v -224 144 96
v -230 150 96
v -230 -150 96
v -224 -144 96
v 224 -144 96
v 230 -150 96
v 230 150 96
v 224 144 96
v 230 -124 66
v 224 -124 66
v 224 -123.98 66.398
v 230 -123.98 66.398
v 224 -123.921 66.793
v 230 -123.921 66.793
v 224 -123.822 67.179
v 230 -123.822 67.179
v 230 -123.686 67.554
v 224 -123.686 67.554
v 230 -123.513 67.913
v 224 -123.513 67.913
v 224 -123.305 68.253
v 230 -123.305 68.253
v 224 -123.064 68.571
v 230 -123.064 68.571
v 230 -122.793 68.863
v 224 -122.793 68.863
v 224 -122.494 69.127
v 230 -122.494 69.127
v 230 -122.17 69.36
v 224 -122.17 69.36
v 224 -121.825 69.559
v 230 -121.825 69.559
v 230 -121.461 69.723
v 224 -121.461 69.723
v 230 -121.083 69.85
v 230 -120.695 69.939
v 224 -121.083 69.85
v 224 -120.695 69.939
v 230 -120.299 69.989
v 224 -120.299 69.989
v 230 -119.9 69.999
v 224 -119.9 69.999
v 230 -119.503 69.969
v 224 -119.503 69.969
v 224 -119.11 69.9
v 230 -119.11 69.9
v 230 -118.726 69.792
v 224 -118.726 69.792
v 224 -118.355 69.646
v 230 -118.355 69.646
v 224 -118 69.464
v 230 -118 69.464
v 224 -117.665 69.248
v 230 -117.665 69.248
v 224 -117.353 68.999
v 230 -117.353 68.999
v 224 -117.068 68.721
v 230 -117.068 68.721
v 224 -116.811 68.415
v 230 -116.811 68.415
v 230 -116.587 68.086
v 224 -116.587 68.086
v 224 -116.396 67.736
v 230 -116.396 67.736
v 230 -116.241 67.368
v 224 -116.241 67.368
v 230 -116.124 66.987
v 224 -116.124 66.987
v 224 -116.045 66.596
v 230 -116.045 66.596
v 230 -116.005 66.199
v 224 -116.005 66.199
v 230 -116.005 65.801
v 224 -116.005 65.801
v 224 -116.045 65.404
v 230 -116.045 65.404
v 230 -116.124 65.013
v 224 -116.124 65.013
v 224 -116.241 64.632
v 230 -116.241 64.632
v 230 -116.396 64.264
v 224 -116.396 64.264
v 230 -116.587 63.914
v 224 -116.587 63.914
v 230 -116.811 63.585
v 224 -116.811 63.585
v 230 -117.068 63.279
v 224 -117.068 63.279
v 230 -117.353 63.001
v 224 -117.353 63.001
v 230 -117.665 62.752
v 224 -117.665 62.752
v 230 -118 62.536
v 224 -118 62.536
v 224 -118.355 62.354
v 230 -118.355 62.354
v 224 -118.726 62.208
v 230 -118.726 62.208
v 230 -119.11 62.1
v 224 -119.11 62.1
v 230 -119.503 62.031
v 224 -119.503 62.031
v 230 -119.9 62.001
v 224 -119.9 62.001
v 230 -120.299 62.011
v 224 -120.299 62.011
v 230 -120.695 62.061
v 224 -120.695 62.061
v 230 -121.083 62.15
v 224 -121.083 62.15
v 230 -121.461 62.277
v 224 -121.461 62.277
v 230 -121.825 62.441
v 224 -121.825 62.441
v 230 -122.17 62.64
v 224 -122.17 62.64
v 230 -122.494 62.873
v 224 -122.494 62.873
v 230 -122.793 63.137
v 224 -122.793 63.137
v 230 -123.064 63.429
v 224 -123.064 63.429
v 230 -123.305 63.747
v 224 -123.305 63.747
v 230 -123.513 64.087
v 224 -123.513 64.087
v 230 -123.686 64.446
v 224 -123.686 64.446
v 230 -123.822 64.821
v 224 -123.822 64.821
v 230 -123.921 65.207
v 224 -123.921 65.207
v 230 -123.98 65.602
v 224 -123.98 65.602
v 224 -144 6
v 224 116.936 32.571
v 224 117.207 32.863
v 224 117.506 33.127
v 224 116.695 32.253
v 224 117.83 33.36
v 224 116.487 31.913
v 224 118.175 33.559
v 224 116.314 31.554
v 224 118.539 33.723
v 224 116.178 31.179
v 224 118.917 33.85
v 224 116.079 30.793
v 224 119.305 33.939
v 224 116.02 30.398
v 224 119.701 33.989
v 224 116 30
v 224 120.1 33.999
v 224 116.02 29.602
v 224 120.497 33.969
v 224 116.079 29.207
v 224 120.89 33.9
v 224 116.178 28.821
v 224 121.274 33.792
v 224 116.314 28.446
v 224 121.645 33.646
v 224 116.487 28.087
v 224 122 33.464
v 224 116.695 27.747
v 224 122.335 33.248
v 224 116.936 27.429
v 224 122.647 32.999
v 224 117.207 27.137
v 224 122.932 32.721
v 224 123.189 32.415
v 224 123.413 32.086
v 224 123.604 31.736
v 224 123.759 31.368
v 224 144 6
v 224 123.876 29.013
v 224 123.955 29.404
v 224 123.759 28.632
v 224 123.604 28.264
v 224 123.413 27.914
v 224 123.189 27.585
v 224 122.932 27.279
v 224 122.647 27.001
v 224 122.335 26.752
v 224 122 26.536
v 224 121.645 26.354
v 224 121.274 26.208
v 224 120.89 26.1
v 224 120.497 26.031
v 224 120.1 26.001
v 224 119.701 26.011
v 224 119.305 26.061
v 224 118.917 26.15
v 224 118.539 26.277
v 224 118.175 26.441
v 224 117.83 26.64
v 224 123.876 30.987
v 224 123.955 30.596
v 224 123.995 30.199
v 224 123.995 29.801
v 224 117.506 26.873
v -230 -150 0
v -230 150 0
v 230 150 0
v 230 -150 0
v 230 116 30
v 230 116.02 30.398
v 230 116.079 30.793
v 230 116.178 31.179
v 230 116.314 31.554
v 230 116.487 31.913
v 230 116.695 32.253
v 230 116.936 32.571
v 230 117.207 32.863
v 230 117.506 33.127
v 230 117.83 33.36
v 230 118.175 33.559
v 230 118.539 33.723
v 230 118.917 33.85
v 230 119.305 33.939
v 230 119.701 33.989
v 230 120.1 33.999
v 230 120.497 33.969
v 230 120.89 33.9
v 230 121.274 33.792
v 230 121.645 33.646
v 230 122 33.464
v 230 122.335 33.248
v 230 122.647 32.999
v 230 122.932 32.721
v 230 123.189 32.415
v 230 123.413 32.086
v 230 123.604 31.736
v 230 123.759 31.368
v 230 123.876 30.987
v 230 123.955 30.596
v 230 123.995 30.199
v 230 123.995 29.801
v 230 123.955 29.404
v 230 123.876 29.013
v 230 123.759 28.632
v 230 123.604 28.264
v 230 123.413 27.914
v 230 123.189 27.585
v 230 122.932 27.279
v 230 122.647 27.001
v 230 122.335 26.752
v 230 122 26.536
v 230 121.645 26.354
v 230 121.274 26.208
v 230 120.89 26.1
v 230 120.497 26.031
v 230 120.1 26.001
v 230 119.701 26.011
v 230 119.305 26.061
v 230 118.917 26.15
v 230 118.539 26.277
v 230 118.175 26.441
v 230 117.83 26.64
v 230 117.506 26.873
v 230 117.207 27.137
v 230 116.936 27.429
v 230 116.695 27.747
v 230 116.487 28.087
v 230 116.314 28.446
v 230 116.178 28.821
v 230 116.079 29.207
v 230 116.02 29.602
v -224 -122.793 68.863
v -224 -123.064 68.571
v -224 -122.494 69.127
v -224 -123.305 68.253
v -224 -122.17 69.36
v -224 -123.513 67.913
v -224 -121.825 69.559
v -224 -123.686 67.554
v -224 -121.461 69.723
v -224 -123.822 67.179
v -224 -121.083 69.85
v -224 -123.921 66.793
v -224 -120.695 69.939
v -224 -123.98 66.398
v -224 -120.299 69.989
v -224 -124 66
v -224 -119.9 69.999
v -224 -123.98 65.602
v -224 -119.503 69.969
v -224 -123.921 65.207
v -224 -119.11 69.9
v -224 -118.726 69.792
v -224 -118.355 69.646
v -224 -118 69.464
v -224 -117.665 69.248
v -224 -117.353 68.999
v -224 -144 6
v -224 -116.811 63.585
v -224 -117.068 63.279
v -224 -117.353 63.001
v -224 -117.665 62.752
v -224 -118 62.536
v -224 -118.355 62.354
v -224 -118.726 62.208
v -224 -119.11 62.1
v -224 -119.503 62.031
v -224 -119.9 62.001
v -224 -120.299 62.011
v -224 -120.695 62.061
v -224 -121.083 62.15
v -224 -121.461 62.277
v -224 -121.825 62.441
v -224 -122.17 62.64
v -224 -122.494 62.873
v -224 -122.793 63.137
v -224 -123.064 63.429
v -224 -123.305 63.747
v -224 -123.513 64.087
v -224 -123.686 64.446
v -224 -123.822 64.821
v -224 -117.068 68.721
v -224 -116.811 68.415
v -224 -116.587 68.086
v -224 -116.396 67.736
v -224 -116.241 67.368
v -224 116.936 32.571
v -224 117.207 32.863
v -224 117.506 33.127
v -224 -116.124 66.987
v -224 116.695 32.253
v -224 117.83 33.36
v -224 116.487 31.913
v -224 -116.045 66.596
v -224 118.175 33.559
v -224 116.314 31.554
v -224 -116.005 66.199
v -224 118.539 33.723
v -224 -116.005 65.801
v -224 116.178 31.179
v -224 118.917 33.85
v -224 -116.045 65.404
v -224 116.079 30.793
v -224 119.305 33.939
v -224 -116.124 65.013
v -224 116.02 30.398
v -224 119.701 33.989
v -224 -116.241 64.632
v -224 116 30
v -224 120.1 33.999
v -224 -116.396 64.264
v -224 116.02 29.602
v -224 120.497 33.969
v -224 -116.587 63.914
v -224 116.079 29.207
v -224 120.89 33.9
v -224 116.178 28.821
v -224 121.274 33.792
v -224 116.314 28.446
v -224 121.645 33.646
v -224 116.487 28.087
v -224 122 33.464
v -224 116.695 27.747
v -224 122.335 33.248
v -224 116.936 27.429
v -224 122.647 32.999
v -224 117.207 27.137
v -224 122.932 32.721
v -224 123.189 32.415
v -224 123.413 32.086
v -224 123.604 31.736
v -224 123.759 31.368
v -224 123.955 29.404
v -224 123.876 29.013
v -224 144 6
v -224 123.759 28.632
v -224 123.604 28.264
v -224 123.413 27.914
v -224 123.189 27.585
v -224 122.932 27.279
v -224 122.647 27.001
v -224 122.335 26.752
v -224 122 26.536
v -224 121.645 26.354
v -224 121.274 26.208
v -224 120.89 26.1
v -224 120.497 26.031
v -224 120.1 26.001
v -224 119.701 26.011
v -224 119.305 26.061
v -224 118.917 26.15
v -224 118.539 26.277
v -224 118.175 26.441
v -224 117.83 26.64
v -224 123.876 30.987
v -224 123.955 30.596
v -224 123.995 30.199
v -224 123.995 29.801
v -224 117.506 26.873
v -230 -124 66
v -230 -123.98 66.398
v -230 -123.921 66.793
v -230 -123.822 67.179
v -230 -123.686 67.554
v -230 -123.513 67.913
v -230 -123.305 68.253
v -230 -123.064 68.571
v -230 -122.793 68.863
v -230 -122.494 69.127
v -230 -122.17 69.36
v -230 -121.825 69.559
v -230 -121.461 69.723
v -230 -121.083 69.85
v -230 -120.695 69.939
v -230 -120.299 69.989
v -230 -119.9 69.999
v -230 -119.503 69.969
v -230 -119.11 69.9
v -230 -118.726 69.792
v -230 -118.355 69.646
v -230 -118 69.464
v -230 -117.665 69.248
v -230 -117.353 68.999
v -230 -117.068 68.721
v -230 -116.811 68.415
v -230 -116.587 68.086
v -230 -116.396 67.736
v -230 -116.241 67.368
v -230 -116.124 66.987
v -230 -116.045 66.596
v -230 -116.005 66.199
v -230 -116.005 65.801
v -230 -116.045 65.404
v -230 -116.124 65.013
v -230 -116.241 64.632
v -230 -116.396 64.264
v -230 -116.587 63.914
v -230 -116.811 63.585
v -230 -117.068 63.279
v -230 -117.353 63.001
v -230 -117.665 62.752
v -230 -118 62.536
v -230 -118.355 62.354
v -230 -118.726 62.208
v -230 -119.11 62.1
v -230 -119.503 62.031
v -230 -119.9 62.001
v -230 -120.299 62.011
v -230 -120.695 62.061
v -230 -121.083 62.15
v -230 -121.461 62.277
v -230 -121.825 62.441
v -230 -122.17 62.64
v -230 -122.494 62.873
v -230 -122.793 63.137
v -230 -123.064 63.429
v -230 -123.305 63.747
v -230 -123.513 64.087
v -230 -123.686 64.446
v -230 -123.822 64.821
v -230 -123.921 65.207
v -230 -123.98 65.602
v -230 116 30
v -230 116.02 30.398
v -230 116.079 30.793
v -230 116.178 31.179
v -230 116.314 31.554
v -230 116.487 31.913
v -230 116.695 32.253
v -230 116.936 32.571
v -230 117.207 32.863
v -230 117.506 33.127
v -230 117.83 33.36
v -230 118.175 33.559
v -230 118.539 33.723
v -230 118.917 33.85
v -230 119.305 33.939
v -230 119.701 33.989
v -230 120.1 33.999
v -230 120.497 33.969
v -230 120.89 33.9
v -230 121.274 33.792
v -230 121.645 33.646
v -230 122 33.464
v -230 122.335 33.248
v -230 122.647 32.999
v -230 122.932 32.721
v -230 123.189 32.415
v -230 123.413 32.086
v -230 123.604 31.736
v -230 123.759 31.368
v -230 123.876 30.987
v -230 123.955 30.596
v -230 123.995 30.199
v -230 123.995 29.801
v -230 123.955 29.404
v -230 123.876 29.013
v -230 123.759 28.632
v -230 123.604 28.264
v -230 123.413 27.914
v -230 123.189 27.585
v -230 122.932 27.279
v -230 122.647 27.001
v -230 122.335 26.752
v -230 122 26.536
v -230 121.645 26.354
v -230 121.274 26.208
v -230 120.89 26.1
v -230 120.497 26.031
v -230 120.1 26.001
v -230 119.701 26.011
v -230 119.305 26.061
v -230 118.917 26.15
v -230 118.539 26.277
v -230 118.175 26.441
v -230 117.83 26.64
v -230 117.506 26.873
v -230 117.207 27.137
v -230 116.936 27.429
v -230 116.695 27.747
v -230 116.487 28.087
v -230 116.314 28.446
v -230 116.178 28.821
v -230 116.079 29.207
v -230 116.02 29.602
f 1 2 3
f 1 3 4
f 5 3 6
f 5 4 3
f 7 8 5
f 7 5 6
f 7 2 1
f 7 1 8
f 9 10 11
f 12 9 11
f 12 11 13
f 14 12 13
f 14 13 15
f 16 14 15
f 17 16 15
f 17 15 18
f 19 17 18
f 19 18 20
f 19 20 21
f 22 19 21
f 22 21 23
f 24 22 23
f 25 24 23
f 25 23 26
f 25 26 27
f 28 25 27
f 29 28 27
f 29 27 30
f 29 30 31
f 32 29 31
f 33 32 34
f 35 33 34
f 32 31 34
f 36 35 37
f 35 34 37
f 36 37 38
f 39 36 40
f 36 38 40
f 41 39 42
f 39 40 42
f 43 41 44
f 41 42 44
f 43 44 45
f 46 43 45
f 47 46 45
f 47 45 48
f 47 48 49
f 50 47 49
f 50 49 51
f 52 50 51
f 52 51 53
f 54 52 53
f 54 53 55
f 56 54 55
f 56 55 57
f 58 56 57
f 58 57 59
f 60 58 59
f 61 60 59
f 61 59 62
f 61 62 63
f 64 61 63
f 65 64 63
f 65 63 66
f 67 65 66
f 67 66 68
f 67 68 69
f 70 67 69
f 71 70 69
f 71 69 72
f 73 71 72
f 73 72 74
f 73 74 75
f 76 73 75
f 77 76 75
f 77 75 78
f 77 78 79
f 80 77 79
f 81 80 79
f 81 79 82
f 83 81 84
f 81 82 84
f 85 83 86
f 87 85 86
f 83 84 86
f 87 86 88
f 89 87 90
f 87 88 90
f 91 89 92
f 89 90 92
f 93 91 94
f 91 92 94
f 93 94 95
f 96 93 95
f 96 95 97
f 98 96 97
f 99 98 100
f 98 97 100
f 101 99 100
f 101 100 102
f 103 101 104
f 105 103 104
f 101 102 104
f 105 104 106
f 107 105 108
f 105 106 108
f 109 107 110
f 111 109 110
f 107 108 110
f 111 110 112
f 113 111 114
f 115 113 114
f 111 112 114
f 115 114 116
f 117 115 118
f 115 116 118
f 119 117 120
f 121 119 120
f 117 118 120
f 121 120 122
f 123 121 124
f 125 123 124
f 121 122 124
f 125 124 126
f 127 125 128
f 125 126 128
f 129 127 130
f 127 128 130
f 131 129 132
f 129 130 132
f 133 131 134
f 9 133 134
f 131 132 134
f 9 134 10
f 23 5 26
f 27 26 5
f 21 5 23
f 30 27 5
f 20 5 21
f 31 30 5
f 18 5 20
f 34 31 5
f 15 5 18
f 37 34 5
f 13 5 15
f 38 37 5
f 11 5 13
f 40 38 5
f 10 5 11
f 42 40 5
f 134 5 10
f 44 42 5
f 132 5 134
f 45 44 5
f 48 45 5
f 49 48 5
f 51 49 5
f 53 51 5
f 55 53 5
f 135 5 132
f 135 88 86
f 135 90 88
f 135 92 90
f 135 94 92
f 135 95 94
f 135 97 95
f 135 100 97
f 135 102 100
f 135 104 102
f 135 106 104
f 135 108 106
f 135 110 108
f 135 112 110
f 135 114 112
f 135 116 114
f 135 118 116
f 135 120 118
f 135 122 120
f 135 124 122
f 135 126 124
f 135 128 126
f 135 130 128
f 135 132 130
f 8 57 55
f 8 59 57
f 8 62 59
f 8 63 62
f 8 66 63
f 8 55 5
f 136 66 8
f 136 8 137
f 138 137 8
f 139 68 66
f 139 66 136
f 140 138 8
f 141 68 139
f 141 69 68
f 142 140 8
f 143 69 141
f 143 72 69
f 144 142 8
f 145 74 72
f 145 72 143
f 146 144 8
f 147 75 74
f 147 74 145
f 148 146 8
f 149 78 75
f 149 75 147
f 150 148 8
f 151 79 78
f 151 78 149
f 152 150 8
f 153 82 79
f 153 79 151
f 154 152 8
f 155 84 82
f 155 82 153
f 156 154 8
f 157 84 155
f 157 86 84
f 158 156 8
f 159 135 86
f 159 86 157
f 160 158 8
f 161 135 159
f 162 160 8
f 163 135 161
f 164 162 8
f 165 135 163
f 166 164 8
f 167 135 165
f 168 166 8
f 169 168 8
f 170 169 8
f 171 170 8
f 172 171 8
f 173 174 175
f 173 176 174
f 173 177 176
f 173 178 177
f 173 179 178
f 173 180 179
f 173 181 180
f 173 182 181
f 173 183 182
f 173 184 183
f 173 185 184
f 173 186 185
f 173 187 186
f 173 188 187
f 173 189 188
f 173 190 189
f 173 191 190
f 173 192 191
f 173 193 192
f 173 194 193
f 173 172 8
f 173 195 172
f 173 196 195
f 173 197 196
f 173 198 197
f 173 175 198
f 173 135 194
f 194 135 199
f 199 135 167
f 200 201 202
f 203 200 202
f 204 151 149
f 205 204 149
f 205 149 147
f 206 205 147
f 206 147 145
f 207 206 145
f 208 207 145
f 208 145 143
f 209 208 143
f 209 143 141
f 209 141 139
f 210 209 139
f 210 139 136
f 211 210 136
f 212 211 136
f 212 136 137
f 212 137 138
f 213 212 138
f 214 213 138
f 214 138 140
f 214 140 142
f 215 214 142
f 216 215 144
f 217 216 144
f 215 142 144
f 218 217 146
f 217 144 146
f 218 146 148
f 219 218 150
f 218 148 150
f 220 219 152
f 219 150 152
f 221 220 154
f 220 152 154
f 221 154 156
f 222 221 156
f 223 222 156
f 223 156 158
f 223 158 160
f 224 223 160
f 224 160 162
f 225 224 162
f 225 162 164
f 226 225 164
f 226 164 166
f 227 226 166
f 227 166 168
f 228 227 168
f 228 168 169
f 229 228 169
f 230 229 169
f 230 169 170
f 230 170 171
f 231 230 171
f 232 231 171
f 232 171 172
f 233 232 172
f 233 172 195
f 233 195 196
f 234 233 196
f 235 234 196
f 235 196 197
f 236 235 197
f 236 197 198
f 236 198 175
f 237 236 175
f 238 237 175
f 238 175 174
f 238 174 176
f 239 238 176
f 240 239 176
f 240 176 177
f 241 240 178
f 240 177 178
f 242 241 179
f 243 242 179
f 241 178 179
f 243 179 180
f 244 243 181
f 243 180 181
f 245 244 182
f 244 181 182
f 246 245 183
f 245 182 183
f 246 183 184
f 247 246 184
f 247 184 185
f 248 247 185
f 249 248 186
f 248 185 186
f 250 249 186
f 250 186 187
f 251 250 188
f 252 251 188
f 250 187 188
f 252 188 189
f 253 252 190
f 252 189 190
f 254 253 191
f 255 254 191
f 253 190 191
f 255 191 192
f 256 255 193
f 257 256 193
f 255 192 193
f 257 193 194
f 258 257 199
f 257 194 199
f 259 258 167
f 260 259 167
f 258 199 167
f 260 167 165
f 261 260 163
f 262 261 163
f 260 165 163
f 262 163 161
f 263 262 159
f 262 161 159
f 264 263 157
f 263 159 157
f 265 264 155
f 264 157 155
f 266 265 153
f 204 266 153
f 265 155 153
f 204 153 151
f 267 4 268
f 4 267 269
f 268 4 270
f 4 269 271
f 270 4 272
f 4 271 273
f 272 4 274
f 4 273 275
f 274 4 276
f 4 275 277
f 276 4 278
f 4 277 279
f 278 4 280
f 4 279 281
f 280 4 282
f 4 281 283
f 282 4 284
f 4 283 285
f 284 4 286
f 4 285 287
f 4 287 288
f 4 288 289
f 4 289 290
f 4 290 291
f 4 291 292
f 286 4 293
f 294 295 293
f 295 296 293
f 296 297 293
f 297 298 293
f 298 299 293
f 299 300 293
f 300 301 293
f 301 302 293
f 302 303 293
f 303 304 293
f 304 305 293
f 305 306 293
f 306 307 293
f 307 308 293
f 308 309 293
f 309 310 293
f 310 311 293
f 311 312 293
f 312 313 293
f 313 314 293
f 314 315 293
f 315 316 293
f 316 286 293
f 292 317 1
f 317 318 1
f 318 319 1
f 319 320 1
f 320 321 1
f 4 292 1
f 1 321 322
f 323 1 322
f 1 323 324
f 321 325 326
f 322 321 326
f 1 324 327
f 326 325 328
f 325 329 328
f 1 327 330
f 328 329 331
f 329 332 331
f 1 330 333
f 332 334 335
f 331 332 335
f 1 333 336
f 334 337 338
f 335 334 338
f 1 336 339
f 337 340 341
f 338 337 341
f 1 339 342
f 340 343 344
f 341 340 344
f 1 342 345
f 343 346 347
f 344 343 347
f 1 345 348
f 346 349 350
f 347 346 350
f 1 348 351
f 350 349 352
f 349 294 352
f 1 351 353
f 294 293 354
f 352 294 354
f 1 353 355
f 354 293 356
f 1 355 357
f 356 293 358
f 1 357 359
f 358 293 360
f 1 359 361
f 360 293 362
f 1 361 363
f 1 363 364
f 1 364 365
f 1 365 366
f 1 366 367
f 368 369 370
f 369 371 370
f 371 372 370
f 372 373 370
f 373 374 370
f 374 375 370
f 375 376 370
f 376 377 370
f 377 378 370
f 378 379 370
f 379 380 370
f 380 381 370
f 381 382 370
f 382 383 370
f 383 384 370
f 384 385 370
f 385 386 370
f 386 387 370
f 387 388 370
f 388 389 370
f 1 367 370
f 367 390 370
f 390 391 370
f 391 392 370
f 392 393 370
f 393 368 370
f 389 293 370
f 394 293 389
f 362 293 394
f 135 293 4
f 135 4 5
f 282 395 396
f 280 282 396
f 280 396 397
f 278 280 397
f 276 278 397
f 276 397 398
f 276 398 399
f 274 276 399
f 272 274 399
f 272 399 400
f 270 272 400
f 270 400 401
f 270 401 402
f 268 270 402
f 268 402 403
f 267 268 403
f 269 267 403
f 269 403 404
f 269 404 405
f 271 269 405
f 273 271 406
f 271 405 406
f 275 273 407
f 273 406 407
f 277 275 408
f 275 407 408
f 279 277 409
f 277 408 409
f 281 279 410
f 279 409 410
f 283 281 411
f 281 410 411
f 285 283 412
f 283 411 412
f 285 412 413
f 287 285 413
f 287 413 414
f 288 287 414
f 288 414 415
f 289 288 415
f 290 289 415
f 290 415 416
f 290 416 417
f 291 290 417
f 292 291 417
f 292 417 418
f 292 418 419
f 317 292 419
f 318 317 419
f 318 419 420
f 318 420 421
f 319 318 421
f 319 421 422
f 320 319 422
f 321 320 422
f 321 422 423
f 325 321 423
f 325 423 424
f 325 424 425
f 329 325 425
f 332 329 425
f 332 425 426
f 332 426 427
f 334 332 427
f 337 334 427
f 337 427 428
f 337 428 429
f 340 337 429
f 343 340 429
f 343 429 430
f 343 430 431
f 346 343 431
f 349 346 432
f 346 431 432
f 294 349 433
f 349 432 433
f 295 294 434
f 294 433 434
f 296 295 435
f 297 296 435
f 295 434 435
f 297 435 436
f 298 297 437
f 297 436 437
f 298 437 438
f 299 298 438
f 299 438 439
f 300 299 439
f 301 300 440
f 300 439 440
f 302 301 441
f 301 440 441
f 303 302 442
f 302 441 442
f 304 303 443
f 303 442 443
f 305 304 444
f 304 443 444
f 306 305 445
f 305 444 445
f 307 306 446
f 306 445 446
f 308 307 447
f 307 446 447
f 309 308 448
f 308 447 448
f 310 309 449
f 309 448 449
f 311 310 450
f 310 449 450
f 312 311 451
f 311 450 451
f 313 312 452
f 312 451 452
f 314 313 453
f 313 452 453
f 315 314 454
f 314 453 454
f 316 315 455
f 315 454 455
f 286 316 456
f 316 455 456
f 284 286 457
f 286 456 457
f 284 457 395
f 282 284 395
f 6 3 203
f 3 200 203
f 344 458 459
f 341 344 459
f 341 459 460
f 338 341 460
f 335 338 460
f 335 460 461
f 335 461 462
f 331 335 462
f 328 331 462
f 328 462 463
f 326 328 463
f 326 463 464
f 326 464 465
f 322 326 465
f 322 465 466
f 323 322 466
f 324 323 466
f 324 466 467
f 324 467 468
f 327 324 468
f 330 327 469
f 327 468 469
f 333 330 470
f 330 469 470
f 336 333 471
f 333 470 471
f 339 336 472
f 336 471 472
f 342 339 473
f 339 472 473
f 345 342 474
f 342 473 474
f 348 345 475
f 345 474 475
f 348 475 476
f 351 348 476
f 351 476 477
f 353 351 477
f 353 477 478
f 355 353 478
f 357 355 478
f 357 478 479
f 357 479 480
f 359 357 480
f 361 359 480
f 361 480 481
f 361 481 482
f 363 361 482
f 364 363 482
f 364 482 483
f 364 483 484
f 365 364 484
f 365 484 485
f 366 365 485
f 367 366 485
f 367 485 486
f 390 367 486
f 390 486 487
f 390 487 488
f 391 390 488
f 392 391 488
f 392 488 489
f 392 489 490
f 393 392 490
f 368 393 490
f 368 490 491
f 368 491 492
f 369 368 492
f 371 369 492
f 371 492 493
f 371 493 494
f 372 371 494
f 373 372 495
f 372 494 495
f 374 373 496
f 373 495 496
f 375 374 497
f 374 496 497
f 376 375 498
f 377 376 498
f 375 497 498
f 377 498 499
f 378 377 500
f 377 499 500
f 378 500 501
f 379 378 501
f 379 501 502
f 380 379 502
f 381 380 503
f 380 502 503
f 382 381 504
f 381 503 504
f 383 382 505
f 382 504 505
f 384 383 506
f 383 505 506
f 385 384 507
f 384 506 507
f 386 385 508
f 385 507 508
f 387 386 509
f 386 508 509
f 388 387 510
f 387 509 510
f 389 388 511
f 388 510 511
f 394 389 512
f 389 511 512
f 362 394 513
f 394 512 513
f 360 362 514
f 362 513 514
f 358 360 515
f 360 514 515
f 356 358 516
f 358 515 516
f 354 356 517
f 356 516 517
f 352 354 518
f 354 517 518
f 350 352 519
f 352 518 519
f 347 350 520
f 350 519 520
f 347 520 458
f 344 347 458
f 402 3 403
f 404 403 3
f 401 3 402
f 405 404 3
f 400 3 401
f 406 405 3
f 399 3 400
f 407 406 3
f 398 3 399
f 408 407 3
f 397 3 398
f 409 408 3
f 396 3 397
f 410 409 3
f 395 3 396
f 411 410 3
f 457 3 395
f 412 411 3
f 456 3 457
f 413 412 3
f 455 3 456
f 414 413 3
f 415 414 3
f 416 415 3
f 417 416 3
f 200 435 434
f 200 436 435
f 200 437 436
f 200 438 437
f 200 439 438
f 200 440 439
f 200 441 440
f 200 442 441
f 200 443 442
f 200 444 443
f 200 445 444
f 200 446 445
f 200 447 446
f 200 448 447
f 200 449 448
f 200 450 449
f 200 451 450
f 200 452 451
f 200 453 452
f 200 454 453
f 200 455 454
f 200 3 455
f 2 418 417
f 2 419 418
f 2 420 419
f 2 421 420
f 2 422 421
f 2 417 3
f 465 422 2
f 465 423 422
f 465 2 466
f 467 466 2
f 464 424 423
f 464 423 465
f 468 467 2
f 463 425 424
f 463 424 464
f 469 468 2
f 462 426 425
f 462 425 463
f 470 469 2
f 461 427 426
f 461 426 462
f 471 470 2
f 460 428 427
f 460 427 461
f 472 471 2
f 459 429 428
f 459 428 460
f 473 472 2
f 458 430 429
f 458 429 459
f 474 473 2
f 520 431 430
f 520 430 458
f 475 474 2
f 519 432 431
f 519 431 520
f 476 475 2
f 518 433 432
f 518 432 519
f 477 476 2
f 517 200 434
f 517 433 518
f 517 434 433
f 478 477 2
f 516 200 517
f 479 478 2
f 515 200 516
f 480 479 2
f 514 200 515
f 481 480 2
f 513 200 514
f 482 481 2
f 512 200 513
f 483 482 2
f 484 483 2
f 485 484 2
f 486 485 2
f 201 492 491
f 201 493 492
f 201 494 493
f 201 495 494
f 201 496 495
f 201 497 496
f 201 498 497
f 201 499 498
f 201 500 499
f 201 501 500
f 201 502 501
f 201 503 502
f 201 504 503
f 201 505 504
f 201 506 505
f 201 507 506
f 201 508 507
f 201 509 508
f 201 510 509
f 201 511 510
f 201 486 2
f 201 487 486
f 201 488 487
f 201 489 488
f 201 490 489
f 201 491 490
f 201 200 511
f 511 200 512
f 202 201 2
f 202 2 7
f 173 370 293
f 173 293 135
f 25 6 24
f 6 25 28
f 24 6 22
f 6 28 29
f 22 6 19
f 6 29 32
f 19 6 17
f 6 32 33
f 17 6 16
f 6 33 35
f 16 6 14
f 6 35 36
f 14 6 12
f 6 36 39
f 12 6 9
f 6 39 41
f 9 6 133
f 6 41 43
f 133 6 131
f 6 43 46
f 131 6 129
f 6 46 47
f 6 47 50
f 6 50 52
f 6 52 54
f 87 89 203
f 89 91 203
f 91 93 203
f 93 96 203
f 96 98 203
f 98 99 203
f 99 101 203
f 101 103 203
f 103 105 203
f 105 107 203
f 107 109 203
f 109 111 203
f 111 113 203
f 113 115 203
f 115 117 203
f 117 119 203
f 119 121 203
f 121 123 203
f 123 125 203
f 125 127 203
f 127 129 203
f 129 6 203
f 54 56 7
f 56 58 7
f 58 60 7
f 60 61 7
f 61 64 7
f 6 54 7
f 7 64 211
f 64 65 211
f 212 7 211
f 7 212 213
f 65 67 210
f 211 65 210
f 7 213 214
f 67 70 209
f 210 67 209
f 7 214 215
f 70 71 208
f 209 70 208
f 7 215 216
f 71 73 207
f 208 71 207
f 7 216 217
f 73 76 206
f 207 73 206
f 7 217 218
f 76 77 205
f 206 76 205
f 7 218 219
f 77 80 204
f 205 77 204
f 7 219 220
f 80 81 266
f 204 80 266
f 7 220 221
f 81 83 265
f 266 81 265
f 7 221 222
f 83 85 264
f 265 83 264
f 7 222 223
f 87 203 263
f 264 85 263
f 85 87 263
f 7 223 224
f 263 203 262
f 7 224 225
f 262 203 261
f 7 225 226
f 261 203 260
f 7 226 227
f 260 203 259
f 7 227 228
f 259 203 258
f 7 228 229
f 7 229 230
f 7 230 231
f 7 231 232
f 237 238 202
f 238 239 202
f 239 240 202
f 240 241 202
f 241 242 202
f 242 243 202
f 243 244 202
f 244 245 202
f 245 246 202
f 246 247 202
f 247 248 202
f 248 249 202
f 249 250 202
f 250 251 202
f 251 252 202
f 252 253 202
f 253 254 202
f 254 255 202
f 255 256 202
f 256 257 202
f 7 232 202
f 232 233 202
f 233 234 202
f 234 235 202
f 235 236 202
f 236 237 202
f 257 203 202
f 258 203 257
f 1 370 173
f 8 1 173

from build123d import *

# Parameters (mm, degrees)
F0_W     = 460
F0_H     = 300
F1_DEPTH = 6
F2_W     = 460
F2_H     = 300
F2_W_2   = 448
F2_H_2   = 288
F3_DEPTH = 90
F4_R     = 4
F5_DEPTH = 460


with BuildPart() as f1:
    # F0 (on Top) → F1 (new body)
    with BuildSketch(Plane.XY):
        Rectangle(F0_W, F0_H)
    extrude(amount=F1_DEPTH)

    # F2 (on face) → F3 (join)
    with BuildSketch(Plane.XY.offset(6)):
        Rectangle(F2_W, F2_H)
        Rectangle(F2_W_2, F2_H_2, mode=Mode.SUBTRACT)
    extrude(amount=F3_DEPTH)

    # F4 (on face) → F5 (cut, through all)
    with BuildSketch(Plane(origin=(-230, 0, 0), x_dir=(0, -1, 0), z_dir=(-1, 0, 0))):
        with Locations((-120, 30)):
            Circle(F4_R)
        with Locations((120, 66)):
            Circle(F4_R)
    extrude(amount=-F5_DEPTH, mode=Mode.SUBTRACT)


solid = f1.part
